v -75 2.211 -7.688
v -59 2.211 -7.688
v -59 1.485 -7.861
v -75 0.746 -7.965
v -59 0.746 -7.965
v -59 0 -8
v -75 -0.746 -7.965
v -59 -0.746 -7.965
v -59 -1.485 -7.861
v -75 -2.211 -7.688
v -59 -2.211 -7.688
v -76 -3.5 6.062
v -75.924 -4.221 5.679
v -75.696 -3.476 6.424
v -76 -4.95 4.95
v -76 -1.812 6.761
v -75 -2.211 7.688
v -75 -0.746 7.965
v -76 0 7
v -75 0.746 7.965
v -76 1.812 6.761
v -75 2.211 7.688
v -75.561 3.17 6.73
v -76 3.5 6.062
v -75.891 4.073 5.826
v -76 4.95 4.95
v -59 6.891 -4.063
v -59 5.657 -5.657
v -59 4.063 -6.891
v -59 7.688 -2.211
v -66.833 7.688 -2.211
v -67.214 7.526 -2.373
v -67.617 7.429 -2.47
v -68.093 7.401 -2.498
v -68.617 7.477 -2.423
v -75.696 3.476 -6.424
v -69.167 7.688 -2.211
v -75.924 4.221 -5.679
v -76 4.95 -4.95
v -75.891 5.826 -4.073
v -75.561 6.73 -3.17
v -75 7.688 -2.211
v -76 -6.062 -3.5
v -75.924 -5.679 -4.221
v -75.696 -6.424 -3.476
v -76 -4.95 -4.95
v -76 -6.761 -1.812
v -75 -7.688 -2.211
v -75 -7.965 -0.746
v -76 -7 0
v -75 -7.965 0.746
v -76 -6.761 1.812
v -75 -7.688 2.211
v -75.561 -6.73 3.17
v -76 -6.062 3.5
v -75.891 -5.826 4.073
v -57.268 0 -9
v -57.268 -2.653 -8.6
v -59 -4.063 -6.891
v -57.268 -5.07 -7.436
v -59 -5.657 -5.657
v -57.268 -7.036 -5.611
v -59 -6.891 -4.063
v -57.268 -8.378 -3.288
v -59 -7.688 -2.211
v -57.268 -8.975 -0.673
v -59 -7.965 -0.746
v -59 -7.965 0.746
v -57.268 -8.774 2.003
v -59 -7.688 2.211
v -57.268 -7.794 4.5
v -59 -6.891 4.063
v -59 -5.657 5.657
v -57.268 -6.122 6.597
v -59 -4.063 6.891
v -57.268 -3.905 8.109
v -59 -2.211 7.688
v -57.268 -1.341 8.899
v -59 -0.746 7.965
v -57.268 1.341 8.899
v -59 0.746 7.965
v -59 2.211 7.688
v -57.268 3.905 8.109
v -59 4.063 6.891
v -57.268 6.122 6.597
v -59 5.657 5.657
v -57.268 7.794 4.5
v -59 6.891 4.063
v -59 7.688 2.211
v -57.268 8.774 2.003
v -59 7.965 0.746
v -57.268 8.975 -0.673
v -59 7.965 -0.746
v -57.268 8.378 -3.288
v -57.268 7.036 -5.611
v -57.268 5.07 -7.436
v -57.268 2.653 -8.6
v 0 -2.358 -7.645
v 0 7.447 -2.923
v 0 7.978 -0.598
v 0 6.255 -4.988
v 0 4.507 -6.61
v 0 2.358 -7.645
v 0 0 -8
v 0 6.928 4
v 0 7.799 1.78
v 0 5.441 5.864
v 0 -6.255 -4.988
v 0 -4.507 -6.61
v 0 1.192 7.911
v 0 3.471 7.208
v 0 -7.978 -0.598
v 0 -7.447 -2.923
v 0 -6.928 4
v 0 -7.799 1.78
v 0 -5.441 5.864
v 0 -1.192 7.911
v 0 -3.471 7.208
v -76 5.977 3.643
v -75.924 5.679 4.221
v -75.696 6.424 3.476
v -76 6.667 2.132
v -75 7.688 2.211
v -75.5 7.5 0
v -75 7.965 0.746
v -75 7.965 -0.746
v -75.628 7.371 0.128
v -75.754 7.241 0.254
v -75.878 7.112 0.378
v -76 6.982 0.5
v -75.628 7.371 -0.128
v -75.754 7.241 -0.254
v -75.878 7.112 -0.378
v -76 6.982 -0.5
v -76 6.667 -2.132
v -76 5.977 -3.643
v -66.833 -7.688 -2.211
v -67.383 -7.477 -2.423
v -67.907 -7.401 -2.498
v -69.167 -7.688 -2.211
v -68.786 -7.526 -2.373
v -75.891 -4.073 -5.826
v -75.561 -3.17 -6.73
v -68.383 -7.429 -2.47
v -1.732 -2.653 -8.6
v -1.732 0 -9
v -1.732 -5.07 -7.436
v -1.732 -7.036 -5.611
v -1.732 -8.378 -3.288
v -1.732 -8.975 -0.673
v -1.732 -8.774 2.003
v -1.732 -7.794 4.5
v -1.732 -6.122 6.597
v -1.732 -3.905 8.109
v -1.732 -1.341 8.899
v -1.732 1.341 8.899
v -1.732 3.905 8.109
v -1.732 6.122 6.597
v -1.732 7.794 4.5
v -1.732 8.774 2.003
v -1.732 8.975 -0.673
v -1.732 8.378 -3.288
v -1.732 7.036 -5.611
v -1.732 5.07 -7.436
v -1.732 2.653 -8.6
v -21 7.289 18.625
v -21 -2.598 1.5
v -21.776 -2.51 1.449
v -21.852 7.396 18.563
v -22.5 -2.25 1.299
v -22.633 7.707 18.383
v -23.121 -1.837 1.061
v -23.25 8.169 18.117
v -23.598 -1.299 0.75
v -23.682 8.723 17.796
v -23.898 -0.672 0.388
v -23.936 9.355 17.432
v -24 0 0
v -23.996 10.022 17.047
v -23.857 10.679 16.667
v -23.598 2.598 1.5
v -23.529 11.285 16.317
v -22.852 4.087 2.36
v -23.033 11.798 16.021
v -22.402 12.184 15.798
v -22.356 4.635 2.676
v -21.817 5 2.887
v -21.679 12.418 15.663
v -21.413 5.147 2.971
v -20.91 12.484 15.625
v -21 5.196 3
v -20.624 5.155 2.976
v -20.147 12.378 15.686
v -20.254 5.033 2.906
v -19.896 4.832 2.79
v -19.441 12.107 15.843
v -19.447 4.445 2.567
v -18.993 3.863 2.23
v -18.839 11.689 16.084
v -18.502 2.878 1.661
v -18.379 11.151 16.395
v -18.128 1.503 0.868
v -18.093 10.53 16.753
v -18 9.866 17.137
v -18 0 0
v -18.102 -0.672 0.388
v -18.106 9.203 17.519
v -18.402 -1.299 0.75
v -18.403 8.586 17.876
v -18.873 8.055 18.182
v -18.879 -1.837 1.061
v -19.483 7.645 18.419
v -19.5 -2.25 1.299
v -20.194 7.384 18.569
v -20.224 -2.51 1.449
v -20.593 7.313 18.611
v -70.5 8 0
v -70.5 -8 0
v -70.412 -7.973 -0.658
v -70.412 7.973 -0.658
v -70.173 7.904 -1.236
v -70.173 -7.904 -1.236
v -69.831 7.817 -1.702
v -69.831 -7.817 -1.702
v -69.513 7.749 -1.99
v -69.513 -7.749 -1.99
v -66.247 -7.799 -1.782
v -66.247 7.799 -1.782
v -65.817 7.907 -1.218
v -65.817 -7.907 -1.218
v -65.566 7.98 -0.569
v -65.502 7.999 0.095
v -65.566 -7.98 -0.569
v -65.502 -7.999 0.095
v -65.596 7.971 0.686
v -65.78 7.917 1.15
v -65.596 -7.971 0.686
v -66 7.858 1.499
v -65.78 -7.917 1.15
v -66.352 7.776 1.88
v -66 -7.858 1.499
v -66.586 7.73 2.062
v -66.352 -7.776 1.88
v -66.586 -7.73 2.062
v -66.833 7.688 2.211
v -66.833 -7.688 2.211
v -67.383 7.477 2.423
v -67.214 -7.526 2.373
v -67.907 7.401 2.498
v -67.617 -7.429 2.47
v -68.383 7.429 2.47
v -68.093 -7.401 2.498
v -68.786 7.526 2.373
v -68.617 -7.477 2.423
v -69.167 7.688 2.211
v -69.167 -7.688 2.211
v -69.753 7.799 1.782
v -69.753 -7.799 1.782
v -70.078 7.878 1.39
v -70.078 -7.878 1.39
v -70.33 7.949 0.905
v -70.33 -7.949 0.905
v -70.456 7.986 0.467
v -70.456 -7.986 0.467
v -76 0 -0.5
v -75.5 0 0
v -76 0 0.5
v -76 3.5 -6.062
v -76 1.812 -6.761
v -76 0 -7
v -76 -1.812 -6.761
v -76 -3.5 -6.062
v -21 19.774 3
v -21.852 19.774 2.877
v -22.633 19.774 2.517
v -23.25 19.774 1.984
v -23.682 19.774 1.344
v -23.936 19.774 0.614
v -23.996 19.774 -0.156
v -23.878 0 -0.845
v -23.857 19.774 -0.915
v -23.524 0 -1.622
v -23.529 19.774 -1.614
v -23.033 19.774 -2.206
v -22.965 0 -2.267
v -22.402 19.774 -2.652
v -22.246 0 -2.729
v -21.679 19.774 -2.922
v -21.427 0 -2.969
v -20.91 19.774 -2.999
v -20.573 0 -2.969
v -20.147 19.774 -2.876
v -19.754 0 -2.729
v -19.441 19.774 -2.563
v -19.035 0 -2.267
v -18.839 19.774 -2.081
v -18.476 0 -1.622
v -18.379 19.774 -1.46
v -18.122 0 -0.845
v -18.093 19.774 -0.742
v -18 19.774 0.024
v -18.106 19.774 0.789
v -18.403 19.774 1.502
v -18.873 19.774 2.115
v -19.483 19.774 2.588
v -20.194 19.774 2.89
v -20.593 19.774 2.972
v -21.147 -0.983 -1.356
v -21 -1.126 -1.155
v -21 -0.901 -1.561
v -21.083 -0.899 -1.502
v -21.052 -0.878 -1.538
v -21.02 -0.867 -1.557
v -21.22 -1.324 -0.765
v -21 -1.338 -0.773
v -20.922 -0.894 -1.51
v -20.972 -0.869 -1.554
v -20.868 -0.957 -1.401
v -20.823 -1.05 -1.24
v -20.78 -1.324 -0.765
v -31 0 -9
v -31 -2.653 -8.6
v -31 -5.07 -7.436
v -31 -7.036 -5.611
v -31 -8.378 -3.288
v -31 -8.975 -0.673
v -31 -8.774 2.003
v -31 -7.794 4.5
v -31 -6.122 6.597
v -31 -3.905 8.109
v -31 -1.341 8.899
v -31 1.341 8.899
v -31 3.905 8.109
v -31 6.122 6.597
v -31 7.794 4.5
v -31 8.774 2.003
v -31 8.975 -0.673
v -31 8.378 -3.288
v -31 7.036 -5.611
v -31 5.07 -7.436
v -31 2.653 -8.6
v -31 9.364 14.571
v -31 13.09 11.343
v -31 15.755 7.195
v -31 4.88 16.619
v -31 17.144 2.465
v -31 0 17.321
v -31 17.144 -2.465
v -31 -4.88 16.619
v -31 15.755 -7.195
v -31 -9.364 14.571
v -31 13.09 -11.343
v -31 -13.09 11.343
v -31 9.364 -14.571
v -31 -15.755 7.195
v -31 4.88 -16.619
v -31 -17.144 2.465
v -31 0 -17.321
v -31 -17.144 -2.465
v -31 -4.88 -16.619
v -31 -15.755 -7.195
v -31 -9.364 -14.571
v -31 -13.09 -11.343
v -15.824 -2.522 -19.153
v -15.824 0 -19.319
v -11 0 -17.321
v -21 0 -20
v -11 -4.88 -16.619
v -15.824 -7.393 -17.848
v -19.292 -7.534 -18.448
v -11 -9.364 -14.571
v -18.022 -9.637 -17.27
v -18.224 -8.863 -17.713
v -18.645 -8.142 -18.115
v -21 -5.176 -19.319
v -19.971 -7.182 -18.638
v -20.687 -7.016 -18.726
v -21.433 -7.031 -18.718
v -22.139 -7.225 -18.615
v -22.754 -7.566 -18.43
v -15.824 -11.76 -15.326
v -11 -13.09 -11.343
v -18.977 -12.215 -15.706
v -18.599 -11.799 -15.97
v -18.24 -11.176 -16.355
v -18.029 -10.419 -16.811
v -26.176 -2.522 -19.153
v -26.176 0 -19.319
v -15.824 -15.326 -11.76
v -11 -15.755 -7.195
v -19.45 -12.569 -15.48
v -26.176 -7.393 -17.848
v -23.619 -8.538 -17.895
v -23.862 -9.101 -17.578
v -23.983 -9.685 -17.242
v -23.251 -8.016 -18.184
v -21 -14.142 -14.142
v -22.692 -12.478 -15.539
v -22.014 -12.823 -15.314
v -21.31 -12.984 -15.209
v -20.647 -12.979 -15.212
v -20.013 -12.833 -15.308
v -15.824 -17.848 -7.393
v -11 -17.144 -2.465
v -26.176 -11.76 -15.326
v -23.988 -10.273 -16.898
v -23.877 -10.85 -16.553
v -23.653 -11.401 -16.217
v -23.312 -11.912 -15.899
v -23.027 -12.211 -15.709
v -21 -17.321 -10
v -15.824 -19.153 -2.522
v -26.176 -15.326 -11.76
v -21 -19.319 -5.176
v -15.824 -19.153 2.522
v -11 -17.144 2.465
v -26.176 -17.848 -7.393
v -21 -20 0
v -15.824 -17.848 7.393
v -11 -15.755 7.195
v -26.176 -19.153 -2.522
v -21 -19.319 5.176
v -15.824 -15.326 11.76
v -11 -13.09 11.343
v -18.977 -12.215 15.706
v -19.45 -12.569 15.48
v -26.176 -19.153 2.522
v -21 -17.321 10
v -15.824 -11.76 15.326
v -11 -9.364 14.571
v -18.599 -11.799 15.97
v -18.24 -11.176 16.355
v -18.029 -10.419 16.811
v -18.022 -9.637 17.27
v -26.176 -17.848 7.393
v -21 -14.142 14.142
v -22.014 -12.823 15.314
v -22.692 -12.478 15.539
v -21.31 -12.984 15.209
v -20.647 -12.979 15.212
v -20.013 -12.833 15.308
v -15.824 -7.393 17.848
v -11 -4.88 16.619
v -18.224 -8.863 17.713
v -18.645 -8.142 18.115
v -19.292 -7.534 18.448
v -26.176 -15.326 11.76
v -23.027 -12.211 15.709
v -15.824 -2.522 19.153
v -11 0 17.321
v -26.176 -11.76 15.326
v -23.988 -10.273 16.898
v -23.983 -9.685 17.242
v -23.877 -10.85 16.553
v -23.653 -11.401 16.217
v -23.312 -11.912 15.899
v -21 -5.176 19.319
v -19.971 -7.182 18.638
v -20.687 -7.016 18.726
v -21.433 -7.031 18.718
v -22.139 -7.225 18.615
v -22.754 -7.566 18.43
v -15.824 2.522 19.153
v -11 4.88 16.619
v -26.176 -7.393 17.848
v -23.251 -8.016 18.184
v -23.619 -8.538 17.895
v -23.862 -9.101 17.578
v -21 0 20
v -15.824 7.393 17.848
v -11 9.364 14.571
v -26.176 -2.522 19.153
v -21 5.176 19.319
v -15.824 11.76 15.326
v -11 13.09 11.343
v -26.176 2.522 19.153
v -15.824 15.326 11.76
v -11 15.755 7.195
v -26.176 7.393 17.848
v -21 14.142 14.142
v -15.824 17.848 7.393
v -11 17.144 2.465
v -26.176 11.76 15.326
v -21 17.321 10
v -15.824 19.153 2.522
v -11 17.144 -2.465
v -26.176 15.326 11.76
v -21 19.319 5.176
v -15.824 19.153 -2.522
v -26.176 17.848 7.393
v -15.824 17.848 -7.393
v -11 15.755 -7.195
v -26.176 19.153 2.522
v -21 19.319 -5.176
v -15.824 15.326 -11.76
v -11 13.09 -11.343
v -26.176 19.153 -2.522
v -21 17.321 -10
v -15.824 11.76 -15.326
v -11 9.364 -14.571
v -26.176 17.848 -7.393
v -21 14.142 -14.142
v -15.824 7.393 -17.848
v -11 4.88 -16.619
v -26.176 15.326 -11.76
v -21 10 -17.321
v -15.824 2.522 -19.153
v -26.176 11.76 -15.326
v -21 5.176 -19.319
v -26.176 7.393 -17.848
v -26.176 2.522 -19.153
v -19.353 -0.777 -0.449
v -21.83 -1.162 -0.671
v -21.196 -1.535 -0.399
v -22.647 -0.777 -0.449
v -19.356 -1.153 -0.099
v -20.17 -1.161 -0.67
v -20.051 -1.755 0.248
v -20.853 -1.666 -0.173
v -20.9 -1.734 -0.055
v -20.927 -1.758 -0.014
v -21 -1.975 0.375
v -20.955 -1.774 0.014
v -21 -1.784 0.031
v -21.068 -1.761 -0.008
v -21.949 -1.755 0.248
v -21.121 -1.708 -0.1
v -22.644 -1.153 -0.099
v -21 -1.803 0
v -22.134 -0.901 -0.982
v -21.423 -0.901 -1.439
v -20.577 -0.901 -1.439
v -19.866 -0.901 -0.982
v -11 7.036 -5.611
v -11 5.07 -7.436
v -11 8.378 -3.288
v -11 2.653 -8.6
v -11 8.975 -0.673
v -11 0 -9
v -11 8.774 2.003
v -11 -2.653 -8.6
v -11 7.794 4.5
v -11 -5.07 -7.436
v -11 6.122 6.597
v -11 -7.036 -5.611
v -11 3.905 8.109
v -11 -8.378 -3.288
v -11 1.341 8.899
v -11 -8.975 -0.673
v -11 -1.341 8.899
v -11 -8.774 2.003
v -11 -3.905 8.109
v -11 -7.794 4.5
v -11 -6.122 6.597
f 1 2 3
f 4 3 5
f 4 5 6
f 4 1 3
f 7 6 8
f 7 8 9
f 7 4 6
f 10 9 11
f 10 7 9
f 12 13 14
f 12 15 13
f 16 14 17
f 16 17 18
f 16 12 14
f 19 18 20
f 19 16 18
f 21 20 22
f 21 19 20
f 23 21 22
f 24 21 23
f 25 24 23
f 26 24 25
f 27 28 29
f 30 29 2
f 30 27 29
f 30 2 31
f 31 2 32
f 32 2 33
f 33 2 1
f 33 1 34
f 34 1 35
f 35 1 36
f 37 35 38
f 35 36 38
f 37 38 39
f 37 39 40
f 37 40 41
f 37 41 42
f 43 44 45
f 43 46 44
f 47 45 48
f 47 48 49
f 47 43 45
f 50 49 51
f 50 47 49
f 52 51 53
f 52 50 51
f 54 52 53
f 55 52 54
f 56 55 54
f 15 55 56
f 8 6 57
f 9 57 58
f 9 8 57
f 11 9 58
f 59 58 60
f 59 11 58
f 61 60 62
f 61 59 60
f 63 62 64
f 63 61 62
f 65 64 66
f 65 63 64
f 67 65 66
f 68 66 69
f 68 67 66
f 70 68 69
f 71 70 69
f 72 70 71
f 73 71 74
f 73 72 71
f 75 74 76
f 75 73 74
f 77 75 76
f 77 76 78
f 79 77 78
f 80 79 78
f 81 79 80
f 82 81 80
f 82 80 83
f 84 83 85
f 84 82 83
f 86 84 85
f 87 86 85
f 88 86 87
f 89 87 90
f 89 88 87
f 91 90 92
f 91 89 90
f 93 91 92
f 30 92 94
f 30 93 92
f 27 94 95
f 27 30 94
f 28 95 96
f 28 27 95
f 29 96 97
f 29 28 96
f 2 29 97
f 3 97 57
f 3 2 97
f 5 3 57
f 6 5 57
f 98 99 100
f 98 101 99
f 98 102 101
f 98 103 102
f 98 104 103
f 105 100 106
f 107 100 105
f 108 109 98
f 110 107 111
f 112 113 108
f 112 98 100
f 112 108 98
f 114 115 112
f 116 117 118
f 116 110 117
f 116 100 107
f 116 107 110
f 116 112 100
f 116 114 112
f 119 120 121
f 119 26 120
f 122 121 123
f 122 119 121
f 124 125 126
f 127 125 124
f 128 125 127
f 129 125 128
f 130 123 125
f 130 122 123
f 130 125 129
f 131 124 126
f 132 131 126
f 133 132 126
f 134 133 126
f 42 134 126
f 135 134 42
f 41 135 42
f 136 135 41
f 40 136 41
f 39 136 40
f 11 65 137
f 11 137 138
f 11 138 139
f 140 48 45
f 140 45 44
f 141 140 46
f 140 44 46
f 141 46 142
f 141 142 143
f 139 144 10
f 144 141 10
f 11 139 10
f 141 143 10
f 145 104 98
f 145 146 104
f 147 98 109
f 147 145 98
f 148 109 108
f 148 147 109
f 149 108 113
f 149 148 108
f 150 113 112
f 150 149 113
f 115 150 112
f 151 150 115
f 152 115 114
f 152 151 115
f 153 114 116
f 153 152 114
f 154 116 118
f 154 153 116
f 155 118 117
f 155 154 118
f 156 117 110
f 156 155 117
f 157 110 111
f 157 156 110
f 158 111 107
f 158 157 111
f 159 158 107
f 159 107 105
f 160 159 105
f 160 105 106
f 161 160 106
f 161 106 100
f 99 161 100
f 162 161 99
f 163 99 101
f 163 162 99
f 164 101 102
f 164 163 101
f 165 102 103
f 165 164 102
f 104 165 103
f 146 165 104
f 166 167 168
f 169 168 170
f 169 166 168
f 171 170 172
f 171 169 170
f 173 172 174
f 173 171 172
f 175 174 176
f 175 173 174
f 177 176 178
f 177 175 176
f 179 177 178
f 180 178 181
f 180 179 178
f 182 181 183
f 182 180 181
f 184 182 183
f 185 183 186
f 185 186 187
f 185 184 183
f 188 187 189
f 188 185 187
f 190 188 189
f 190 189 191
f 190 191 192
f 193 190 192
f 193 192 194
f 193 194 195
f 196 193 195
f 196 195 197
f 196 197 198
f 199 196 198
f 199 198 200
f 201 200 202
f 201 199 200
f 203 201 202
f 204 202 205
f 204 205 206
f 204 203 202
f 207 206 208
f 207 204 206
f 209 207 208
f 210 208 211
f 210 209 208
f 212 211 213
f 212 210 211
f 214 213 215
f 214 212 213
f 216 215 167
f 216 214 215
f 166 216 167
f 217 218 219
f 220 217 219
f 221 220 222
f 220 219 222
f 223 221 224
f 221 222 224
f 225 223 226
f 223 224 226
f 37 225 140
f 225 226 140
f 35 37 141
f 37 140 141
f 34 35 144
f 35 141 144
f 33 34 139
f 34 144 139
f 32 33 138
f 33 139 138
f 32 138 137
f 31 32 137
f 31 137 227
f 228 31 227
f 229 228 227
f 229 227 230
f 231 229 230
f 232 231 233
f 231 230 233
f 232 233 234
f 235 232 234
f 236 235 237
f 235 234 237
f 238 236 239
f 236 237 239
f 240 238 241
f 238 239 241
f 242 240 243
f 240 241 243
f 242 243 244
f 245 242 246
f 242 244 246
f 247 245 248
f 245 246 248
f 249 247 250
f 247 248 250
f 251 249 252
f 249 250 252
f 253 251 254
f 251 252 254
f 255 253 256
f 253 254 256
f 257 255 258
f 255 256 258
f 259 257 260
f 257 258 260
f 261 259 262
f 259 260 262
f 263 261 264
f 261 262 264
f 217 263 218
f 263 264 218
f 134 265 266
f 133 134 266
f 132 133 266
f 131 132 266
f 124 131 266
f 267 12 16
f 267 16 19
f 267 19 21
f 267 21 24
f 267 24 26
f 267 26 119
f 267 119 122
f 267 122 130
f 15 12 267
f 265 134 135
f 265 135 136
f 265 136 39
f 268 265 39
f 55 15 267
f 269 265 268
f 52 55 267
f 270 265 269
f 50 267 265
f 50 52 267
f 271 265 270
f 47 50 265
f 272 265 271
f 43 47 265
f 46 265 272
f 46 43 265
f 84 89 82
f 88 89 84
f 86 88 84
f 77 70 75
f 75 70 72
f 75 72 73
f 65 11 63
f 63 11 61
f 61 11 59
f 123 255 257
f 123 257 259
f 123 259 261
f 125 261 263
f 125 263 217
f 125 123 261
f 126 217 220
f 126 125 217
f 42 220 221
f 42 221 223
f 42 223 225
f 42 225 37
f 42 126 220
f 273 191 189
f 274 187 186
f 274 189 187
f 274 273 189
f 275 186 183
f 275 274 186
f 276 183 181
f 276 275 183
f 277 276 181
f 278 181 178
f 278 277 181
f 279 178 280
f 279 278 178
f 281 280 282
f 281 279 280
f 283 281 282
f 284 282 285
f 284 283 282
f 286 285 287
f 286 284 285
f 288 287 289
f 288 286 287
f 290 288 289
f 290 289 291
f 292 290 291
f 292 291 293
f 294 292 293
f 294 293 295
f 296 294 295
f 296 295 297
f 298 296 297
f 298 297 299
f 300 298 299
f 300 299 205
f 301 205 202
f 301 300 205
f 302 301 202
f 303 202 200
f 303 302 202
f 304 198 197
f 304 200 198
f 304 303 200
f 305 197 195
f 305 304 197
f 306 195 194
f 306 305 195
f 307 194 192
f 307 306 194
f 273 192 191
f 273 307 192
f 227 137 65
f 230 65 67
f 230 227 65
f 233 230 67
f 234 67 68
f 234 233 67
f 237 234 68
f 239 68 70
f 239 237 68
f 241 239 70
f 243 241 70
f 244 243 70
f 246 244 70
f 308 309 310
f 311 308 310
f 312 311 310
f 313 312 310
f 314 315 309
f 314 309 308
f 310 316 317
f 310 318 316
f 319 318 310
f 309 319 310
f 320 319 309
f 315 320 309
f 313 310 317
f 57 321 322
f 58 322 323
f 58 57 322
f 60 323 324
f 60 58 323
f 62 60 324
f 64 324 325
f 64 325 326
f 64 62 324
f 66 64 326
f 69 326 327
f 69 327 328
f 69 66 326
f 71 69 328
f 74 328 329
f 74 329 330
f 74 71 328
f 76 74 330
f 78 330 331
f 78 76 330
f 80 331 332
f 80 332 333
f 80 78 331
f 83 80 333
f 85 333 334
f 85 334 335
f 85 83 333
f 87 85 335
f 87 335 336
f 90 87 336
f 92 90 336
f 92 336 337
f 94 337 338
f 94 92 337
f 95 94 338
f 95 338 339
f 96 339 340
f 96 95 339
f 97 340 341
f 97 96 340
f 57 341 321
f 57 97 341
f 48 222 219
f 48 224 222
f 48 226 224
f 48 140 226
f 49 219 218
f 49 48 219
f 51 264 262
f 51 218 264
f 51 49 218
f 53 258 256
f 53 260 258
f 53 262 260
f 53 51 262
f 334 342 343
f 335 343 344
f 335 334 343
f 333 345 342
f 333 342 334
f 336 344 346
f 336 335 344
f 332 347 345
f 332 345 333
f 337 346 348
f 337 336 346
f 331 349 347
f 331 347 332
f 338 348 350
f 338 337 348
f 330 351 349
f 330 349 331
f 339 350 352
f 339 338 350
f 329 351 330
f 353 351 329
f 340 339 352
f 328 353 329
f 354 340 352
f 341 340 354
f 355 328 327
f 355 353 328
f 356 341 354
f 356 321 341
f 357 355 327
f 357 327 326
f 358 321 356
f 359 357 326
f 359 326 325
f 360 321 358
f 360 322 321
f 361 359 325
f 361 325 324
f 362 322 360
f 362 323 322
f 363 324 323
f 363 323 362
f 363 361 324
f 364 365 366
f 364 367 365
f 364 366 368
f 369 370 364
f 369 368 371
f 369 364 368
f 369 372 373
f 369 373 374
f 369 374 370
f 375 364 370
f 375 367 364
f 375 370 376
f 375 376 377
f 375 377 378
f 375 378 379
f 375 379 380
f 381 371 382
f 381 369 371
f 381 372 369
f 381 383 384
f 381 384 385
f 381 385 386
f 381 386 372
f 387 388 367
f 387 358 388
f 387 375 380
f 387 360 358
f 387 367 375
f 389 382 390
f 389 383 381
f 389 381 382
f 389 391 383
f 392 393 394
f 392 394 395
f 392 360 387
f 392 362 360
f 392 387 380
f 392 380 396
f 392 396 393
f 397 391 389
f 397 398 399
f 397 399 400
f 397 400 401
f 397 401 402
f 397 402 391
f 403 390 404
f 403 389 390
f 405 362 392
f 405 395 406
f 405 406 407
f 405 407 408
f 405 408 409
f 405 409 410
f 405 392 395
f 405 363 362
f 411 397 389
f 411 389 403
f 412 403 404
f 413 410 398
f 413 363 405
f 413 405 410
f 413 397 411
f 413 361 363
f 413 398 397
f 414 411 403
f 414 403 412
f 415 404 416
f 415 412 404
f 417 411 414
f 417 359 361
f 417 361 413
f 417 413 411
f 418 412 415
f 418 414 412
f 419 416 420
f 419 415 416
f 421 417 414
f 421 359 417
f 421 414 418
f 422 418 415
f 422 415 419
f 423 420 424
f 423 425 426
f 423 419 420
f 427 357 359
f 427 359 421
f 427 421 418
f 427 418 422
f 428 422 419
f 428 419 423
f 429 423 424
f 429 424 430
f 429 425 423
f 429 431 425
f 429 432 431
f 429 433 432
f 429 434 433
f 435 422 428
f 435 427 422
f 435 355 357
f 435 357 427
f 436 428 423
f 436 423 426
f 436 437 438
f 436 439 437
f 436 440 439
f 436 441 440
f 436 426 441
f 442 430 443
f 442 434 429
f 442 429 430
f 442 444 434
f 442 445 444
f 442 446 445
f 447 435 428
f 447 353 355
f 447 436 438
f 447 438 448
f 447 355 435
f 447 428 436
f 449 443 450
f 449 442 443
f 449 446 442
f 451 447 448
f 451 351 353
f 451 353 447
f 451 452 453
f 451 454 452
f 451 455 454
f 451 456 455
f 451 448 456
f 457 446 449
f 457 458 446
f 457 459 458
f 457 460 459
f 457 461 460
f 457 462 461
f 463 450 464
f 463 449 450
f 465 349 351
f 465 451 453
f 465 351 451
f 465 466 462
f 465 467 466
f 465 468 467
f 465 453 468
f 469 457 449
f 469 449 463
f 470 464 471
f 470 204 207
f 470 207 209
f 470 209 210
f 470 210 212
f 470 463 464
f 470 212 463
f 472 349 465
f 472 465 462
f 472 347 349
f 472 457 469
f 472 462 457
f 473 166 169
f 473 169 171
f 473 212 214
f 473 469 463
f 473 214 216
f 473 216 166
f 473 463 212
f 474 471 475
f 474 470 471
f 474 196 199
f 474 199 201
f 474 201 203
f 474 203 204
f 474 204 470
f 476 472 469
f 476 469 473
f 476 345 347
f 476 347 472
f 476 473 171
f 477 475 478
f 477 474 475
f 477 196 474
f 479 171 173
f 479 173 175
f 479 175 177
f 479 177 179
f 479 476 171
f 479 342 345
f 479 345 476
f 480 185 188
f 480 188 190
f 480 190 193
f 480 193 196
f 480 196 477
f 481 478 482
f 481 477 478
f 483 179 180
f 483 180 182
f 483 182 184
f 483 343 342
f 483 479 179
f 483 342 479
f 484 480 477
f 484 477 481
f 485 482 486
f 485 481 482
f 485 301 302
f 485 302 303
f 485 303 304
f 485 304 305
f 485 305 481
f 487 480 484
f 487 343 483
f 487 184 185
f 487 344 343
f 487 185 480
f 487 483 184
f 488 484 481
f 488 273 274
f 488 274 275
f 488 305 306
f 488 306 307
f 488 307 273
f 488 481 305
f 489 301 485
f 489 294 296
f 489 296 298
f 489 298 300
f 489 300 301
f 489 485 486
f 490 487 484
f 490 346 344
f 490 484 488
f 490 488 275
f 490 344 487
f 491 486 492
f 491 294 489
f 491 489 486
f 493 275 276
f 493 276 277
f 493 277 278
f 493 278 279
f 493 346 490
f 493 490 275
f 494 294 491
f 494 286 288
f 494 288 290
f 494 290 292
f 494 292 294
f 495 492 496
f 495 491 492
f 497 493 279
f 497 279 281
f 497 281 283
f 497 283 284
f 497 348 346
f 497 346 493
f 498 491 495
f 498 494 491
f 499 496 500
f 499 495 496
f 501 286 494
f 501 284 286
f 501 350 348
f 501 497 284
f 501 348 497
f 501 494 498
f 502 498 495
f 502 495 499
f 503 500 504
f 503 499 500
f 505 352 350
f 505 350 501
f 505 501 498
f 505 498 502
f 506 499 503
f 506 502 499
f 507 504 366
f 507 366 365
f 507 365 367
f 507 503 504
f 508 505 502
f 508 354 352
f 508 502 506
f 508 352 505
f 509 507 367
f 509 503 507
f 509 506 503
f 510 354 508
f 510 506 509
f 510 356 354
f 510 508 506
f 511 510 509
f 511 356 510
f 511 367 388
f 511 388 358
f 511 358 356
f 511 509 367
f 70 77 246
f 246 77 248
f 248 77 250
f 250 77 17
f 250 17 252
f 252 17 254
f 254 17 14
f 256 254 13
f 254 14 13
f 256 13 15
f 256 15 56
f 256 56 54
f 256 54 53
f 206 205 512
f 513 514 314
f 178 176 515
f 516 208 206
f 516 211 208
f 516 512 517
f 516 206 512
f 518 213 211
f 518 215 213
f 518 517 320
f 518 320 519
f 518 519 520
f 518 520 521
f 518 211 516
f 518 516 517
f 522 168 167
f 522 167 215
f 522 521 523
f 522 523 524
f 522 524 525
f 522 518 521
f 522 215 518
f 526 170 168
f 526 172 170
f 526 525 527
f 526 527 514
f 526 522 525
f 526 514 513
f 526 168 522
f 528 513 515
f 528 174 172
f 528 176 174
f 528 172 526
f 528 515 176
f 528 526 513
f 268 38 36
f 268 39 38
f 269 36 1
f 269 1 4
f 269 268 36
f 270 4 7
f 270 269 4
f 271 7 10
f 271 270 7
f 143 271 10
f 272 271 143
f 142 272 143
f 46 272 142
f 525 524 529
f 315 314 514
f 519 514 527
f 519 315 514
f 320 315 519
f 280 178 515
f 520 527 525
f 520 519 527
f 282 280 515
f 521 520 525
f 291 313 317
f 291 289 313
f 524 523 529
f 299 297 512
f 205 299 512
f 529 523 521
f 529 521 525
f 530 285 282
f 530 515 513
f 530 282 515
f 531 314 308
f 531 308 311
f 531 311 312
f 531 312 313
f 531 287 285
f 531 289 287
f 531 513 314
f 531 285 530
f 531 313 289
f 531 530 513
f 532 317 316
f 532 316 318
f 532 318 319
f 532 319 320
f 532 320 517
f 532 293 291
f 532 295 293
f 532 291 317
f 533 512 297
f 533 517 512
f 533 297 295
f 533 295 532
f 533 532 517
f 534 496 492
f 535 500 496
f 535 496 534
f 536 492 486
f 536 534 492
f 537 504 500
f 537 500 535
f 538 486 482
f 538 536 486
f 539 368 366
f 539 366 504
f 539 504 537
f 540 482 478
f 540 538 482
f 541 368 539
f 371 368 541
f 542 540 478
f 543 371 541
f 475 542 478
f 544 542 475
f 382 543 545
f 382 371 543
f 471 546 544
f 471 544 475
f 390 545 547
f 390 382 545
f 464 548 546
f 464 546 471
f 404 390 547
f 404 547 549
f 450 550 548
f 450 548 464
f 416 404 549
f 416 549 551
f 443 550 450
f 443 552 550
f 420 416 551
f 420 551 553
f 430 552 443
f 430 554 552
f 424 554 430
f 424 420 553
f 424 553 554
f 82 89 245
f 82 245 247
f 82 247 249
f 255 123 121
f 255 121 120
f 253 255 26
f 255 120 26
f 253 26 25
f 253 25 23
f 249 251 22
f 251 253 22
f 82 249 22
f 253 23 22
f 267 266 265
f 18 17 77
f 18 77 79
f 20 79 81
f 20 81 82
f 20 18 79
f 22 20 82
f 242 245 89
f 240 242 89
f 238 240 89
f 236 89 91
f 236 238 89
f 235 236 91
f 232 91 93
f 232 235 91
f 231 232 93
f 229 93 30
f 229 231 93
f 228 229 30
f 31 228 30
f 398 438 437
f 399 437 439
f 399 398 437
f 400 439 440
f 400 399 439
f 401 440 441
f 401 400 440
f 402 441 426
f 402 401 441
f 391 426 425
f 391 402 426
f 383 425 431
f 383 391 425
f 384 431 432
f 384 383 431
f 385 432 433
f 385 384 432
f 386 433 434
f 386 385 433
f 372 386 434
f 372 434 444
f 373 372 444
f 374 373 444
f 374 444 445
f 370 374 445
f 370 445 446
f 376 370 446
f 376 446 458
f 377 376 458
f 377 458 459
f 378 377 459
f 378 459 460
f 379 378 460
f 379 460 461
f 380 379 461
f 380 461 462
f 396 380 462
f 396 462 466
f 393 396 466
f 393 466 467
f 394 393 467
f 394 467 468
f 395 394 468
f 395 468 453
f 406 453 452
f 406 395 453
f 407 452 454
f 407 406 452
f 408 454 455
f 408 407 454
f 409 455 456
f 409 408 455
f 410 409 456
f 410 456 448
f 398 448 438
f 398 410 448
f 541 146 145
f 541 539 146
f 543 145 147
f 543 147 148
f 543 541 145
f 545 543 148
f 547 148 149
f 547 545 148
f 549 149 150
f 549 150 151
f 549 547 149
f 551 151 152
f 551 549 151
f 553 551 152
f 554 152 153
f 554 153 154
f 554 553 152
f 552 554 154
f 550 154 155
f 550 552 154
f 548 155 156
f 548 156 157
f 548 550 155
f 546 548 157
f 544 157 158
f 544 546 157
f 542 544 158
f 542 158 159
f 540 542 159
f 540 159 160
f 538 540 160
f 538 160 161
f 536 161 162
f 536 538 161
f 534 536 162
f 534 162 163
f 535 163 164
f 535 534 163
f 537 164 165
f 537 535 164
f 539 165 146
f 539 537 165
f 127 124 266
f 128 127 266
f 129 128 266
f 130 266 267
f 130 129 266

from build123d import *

# Parameters (mm, degrees)
CUT_EXTRUDE_1_DEPTH      = 82.092539731
CUT_EXTRUDE_1_DEPTH_BACK = 82.092539731
SKETCH_2_R               = 3
PATTERN_CIRCULAR_1_COUNT = 2
PATTERN_CIRCULAR_1_ANGLE = 60
SKETCH_6_OUTSIDE_W       = 60.93
SKETCH_6_OUTSIDE_H       = 60.704
CUT_EXTRUDE_2_DEPTH      = 17
HOLE_WIZARD_M61_D        = 5
CUT_EXTRUDE_3_DEPTH      = 10


with BuildPart() as part:
    # Эскиз1 → Повернуть1 (revolve)
    with BuildSketch(Plane.XY, mode=Mode.PRIVATE) as revolve_1_sk:
        with BuildLine():
            Line((0, 0), (0, 8))
            Line((0, 8), (-1.732050808, 9))
            Line((-1.732050808, 9), (-11, 9))
            Line((-11, 9), (-11, 17.320508076))
            ThreePointArc((-11, 17.320508076), (-21, 20), (-31, 17.320508076))
            Line((-31, 17.320508076), (-31, 9))
            Line((-31, 9), (-57.267949192, 9))
            Line((-57.267949192, 9), (-59, 8))
            Line((-59, 8), (-75, 8))
            Line((-75, 8), (-76, 7))
            Line((-76, 7), (-76, 0))
            Line((-76, 0), (0, 0))
        make_face()
    revolve(revolve_1_sk.sketch.rotate(Axis((0, 0, 0), (-1, 0, 0)), 90), axis=Axis((0, 0, 0), (-1, 0, 0)))

    # Эскиз2 → Вырез-Вытянуть1 (cut, two sides: drawn at the far end of the back side and taken through both)
    with BuildSketch(Plane.XY.offset(-CUT_EXTRUDE_1_DEPTH_BACK)):
        with Locations(Location((-21, -10, 0), (0, 0, 235.677064265))):
            Circle(SKETCH_2_R)
    extrude(amount=CUT_EXTRUDE_1_DEPTH + CUT_EXTRUDE_1_DEPTH_BACK, mode=Mode.SUBTRACT)

    # Эскиз4 → Диаметр отверстия Ø6.0 (6)1 (revolve, cut)
    with BuildSketch(Plane(origin=(-21, 20, 0), x_dir=(0, 0, 1), z_dir=(1, 0, 0))):
        Polygon((0, 0), (0, 21.802581857), (3, 20), (3, 0), align=None)
    hole_wizard_6_0_6_1 = revolve(axis=Axis((-21, 20, 0), (0, -1, 0)), mode=Mode.SUBTRACT)

    # Круговой массив1: Диаметр отверстия Ø6.0 (6)1 ×2 about axis
    pattern_circular_1_axis = Axis((0, 0, 0), (1, 0, 0))
    for i in range(1, PATTERN_CIRCULAR_1_COUNT):
        add(hole_wizard_6_0_6_1.rotate(pattern_circular_1_axis, i * PATTERN_CIRCULAR_1_ANGLE / (PATTERN_CIRCULAR_1_COUNT - 1)), mode=Mode.SUBTRACT)

    # Эскиз6 outside → Вырез-Вытянуть2 (cut)
    with BuildSketch(Plane.ZY.offset(76)):
        with Locations((0, -0.113)):
            Rectangle(SKETCH_6_OUTSIDE_W, SKETCH_6_OUTSIDE_H)
        Polygon((-9.899494937, 0), (0, 9.899494937), (9.899494937, 0), (0, -9.899494937), align=None, mode=Mode.SUBTRACT)
    extrude(amount=-CUT_EXTRUDE_2_DEPTH, mode=Mode.SUBTRACT)

    # Отверстие обработанное метчиком M61 (through all)
    with Locations(Plane(origin=(0, 10, 0), x_dir=(1, 0, 0), z_dir=(0, 1, 0))):
        with Locations((-68, 0)):
            Hole(HOLE_WIZARD_M61_D / 2)

    # Эскиз11 → Вырез-Вытянуть3 (cut)
    with BuildSketch(Plane(origin=(0, 10, 0), x_dir=(1, 0, 0), z_dir=(0, 1, 0))):
        Polygon((-76, 0.5), (-75.5, 0), (-76, -0.5), align=None)
    extrude(amount=-CUT_EXTRUDE_3_DEPTH, mode=Mode.SUBTRACT)


solid = part.part
